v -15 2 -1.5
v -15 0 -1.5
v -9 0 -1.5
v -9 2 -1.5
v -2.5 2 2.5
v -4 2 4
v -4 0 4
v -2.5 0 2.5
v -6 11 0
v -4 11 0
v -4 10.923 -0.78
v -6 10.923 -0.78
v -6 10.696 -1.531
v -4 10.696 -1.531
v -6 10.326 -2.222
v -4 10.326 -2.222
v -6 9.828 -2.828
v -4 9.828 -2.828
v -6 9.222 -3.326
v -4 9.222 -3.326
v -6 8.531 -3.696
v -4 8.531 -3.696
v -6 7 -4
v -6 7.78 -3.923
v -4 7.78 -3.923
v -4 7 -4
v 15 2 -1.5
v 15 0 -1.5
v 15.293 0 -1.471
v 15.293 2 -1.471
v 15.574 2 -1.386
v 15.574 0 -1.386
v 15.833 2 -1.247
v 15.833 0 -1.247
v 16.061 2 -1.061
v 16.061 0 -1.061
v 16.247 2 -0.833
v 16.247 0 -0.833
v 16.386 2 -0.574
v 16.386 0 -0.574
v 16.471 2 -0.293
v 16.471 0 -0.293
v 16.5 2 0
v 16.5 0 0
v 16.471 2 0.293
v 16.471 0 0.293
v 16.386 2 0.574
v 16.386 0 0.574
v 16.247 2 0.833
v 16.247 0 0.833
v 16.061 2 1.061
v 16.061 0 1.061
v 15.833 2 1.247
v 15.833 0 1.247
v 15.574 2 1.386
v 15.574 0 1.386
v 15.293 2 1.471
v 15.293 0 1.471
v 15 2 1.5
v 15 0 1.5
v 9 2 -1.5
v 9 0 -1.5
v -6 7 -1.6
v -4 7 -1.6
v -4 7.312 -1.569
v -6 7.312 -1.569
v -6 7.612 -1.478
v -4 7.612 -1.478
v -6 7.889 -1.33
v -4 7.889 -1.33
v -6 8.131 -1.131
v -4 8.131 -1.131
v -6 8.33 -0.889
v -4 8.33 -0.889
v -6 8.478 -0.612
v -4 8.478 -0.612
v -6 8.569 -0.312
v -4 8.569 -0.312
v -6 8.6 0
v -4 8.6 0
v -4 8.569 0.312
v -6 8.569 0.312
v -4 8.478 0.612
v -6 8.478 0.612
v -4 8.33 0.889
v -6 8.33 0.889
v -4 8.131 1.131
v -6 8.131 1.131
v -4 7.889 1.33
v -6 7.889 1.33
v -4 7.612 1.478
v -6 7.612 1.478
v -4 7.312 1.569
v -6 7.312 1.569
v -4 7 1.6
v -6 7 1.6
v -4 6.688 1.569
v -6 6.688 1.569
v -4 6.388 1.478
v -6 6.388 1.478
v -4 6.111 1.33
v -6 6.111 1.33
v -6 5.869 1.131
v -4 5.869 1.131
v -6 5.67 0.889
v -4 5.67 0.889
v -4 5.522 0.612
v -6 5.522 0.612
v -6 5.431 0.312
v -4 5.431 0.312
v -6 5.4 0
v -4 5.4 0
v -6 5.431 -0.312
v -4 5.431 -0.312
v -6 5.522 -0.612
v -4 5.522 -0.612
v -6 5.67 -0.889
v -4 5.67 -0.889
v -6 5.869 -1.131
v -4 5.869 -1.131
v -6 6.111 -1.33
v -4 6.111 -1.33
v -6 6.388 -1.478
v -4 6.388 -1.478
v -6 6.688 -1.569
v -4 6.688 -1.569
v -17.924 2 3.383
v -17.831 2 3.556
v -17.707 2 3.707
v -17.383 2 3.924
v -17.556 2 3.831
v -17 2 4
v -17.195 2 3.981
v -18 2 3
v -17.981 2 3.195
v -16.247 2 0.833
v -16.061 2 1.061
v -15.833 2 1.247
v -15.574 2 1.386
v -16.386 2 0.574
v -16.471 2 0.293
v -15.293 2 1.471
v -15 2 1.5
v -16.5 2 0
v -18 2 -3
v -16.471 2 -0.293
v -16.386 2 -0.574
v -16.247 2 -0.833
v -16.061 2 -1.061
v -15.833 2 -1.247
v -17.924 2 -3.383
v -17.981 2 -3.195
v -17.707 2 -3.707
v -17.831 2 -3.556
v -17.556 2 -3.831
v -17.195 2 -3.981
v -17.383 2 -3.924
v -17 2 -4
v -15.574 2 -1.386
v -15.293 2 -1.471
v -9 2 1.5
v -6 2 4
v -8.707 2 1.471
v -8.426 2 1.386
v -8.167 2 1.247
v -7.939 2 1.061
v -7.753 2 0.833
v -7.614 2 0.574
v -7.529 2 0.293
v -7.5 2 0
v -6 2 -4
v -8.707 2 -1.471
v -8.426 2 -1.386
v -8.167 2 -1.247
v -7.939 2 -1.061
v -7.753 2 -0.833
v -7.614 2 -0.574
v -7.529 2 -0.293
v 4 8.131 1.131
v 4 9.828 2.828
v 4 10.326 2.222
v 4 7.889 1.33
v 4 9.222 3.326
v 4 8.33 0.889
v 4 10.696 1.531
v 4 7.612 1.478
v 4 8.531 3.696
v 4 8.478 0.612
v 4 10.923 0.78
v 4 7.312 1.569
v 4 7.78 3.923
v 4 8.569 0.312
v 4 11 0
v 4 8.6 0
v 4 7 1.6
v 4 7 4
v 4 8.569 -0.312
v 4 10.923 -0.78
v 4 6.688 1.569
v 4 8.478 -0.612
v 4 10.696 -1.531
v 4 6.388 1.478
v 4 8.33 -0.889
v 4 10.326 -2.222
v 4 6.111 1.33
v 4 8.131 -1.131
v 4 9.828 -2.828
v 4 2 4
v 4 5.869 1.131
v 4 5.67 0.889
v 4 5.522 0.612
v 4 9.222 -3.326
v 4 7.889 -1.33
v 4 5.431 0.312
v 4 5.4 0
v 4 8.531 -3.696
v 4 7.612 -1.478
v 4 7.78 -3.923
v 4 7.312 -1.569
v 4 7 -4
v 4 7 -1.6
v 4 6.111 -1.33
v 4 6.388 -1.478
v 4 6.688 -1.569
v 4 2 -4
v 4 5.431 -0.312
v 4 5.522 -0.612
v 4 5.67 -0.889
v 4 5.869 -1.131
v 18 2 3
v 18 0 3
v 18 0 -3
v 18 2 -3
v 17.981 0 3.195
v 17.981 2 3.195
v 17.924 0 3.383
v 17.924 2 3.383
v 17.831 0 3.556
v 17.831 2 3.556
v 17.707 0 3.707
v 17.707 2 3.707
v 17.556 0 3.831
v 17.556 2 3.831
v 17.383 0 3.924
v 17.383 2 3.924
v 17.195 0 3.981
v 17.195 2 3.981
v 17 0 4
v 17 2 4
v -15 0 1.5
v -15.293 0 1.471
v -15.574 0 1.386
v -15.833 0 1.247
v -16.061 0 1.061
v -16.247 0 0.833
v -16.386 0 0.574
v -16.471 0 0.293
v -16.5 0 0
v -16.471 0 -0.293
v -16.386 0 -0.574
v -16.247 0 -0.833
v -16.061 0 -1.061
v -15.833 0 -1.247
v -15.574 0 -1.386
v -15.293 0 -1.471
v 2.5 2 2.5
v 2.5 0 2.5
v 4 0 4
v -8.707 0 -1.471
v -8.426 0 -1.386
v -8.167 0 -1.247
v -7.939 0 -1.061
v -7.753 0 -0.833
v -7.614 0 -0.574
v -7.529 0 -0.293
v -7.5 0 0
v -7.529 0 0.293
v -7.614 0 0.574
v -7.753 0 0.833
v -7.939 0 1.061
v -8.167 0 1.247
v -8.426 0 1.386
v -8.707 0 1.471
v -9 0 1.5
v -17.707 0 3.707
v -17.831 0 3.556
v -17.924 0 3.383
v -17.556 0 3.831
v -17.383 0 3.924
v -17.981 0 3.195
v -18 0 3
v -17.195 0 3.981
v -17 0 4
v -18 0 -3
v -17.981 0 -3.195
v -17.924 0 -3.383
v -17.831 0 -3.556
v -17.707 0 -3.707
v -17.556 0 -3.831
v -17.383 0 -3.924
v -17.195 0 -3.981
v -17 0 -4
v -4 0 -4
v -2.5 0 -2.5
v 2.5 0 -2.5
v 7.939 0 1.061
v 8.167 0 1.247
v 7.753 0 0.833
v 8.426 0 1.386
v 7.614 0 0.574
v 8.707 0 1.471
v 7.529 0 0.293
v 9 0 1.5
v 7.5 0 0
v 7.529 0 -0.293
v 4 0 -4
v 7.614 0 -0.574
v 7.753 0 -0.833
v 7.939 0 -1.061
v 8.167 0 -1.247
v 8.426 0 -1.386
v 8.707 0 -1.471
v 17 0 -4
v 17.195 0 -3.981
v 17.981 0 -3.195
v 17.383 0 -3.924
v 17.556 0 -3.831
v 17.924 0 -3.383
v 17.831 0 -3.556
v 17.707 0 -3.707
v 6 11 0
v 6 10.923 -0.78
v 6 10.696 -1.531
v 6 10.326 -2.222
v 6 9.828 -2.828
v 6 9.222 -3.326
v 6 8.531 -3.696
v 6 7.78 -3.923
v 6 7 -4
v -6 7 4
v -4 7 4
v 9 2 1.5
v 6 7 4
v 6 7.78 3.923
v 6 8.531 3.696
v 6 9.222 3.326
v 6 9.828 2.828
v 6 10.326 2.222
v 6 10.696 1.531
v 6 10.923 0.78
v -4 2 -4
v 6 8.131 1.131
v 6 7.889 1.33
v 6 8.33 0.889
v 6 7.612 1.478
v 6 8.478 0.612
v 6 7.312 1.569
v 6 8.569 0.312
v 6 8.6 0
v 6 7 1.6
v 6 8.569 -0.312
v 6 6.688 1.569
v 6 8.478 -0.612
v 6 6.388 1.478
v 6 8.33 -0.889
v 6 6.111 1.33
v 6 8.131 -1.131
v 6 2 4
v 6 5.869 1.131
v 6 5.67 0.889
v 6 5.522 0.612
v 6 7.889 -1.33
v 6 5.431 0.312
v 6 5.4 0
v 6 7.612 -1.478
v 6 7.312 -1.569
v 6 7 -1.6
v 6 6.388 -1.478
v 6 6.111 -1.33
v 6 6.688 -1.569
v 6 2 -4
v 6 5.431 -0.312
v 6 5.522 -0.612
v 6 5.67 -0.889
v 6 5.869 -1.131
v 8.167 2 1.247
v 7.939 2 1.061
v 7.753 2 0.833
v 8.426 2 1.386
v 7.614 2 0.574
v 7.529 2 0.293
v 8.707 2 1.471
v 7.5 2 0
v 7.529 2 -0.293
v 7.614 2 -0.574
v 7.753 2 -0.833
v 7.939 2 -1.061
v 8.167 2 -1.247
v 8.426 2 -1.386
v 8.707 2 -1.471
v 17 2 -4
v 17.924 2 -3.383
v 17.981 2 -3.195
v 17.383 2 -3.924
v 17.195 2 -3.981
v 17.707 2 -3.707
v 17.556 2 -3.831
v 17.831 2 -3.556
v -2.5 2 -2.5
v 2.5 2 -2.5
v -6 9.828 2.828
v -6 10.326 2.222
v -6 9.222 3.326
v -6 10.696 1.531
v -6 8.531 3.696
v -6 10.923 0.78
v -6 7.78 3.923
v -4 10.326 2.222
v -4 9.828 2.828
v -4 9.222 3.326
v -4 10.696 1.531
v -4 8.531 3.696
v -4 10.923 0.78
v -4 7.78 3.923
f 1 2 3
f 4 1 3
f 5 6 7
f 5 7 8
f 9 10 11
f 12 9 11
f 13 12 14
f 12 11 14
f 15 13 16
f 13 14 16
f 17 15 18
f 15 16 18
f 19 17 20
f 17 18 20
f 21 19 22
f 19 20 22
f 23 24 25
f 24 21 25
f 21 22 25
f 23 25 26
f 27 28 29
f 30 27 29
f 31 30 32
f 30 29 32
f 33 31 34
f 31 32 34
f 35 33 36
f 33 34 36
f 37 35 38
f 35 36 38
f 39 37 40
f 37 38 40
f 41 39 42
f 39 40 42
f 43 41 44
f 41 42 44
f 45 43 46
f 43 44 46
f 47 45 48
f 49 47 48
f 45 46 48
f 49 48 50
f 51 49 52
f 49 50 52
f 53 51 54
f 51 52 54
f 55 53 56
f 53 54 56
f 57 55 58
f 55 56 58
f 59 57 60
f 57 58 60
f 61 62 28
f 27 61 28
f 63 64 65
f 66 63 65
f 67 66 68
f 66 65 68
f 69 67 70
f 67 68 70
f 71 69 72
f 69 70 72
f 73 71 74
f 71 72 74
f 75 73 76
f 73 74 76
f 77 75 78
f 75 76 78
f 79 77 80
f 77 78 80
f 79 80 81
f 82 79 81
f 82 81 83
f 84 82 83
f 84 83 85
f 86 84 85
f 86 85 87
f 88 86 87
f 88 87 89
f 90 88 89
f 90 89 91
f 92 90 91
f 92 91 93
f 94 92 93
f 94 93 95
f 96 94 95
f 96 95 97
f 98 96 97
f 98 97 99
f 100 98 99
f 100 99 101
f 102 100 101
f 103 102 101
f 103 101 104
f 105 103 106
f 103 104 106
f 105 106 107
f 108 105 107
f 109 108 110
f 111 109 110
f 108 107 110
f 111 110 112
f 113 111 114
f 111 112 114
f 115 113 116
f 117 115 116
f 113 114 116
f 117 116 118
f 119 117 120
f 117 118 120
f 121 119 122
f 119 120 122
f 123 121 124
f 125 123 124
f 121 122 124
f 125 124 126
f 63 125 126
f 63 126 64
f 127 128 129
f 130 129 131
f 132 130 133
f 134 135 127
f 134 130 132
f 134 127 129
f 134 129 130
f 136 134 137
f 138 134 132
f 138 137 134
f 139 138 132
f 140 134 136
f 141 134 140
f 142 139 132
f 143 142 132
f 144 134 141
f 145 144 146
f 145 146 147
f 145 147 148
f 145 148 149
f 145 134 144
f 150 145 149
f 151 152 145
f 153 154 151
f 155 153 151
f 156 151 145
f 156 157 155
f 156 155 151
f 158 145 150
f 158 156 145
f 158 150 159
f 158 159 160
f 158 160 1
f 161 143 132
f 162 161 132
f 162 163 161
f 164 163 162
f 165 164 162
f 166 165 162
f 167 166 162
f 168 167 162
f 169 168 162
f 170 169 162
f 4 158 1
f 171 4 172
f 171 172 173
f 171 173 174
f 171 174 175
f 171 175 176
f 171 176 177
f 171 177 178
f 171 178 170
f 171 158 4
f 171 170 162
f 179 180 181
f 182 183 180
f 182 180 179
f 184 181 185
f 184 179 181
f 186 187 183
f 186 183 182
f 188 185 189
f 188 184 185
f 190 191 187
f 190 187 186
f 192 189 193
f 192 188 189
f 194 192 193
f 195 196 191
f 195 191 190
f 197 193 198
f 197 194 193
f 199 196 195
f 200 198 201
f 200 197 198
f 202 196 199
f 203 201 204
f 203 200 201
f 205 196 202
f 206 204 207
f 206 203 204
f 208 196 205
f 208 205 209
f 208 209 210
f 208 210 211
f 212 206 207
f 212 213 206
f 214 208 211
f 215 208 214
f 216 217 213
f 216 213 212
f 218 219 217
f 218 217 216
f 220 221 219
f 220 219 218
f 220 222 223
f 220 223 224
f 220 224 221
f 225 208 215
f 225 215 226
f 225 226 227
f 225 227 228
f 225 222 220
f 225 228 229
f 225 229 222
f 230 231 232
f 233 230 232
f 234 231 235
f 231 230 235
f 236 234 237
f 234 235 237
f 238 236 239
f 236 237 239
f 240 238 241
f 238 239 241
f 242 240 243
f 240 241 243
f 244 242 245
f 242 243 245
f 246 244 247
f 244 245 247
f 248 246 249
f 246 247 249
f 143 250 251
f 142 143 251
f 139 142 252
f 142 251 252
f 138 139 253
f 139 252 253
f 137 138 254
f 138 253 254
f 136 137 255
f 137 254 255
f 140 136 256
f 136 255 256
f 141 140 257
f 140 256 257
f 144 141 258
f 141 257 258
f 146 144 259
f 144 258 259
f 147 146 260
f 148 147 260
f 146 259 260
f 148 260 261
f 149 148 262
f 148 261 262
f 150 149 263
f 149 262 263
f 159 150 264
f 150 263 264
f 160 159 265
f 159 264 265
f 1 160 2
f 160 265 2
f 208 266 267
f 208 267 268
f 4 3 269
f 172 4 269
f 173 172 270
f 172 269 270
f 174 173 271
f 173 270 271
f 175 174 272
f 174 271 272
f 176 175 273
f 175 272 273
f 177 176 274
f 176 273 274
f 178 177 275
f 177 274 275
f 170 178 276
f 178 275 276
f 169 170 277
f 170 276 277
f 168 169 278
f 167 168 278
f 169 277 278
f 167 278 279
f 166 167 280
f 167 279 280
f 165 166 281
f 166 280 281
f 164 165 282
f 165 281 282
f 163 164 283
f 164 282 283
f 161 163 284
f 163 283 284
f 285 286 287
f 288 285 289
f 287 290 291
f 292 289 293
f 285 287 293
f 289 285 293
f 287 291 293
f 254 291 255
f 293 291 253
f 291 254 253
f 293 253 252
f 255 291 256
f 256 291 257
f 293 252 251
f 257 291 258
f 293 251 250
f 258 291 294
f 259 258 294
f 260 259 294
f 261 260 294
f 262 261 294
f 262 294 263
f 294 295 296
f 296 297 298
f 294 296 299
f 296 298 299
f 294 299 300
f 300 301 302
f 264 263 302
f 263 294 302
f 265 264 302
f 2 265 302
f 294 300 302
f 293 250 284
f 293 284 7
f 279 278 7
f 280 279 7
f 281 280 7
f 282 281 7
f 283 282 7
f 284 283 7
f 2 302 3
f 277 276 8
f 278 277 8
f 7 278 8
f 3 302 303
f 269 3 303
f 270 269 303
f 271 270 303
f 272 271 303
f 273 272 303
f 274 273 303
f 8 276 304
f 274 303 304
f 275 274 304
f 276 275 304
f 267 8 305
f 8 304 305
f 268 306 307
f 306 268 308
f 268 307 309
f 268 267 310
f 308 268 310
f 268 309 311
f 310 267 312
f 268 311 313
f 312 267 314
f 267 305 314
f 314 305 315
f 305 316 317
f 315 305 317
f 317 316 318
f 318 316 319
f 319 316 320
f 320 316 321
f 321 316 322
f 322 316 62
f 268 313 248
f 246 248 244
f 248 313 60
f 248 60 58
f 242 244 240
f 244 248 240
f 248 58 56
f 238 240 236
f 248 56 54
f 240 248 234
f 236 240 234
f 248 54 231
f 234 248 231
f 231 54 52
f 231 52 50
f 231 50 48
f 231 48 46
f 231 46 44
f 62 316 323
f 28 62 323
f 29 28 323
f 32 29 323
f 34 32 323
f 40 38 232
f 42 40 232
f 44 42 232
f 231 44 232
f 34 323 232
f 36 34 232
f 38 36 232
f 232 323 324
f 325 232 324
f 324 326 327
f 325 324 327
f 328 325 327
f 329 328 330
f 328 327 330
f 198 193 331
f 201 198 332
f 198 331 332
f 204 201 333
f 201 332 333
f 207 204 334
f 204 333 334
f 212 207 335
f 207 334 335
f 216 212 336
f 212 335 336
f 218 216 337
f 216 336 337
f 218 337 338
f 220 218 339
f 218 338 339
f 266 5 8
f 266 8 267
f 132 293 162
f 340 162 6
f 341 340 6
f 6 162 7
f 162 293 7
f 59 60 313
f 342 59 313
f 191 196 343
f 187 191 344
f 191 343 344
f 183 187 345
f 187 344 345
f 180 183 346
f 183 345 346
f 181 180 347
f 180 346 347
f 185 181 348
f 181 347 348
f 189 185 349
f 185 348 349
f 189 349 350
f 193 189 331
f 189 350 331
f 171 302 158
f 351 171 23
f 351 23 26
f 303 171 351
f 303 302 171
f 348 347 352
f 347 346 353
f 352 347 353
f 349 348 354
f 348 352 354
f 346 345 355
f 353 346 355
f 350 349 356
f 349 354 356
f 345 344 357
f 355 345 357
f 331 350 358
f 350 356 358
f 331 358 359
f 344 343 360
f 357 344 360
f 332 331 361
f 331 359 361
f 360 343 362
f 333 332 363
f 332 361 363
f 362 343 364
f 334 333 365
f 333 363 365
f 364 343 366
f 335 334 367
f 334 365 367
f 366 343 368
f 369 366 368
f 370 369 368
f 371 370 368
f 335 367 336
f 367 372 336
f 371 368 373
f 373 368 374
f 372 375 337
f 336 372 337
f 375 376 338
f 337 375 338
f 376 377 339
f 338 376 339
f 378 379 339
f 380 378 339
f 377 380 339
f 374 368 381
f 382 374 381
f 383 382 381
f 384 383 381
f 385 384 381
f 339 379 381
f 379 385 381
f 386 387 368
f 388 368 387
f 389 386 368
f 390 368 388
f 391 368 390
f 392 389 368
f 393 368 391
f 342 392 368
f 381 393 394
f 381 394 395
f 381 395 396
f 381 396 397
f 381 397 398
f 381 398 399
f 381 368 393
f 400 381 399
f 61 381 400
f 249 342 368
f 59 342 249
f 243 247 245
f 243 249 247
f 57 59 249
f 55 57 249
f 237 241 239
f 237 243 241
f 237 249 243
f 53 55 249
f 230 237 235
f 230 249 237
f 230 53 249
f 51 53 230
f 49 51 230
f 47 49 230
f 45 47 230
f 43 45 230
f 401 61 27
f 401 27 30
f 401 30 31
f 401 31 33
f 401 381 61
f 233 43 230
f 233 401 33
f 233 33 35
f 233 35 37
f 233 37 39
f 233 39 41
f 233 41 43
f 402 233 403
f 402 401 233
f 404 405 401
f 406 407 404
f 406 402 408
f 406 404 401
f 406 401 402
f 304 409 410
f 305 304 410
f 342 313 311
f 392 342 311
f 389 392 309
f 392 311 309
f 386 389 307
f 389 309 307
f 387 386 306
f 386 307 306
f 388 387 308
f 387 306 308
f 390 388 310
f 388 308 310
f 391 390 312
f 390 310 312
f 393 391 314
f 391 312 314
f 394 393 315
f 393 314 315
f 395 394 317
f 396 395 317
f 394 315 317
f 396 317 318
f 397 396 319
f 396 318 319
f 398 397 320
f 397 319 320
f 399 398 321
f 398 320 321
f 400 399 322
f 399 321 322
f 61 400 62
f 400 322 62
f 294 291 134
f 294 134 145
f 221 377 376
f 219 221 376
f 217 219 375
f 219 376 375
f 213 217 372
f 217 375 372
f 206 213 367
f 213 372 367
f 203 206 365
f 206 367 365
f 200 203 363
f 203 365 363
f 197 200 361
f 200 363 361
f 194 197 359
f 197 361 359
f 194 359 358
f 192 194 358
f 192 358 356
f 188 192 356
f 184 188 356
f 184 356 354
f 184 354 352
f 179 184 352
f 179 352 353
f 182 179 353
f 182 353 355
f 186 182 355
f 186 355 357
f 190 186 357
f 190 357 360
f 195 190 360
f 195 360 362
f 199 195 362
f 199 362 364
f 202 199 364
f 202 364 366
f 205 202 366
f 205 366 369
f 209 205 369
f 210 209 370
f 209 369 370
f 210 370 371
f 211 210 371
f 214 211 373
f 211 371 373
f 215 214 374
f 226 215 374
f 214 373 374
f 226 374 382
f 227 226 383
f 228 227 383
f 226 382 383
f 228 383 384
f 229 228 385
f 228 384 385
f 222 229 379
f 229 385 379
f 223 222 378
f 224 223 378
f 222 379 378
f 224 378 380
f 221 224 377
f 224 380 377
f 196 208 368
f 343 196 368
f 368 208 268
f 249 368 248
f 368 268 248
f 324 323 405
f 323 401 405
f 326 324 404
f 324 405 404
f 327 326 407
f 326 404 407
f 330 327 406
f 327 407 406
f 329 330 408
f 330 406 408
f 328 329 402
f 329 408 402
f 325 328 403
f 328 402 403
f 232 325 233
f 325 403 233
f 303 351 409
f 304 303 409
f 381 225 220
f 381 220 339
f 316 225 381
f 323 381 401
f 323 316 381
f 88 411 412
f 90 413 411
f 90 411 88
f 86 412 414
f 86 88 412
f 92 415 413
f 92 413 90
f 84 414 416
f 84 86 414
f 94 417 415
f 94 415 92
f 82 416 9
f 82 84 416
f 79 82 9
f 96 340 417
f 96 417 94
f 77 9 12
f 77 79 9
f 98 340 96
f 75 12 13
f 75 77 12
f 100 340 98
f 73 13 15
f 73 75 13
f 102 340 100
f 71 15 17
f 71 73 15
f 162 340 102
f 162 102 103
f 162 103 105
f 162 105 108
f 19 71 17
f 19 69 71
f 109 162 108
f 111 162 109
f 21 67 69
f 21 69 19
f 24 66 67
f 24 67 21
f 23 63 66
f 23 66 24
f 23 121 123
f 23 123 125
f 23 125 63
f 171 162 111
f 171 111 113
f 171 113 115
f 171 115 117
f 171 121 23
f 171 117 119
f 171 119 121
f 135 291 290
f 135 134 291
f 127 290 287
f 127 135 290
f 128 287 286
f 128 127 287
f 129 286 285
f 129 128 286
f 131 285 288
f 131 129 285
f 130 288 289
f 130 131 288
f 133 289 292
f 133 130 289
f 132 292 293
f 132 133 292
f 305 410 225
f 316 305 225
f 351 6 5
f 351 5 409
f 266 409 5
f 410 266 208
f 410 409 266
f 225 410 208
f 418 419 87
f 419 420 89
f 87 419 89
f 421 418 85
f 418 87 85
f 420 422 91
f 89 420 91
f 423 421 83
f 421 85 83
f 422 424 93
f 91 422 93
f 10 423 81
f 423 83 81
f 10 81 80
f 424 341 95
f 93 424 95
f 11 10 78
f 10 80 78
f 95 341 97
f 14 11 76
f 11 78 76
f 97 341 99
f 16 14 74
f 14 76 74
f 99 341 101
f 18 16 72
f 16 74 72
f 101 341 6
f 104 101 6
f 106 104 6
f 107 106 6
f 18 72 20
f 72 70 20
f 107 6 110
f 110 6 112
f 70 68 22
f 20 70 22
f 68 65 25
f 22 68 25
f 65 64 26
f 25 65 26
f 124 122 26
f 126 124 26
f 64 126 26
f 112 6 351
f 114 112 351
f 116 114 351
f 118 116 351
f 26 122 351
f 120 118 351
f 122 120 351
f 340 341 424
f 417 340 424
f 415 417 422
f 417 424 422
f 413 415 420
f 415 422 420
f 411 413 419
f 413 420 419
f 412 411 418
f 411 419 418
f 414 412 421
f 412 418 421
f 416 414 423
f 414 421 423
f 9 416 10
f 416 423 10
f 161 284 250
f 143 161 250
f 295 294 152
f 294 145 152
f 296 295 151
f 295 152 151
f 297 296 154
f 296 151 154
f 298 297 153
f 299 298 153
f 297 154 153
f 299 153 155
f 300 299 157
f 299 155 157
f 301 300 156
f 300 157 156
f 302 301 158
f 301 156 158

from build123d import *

# Parameters (mm, degrees)
SKETCH_1_W          = 36
SKETCH_1_H          = 8
EXTRUDE_1_DEPTH     = 2
SKETCH_2_W          = 2
SKETCH_2_H          = 8
EXTRUDE_2_DEPTH     = 9
CUT_EXTRUDE_1_DEPTH = 21.518284529
SKETCH_4_R          = 1.6
CUT_EXTRUDE_2_DEPTH = 27.702059846
FILLET_1_R          = 1


with BuildPart() as part:
    # 草图1 → 凸台-拉伸1 (new body)
    with BuildSketch(Plane(origin=(0, 0, 0), x_dir=(1, 0, 0), z_dir=(0, 1, 0))):
        Rectangle(SKETCH_1_W, SKETCH_1_H)
        with BuildLine():
            Line((-15, 1.5), (-9, 1.5))
            ThreePointArc((-9, 1.5), (-7.5, 0), (-9, -1.5))
            Line((-9, -1.5), (-15, -1.5))
            ThreePointArc((-15, -1.5), (-16.5, 0), (-15, 1.5))
        make_face(mode=Mode.SUBTRACT)
        with BuildLine():
            Line((9, 1.5), (15, 1.5))
            ThreePointArc((15, 1.5), (16.5, 0), (15, -1.5))
            Line((15, -1.5), (9, -1.5))
            ThreePointArc((9, -1.5), (7.5, 0), (9, 1.5))
        make_face(mode=Mode.SUBTRACT)
    extrude(amount=EXTRUDE_1_DEPTH)

    # 草图2 → 凸台-拉伸2 (add)
    with BuildSketch(Plane(origin=(0, 2, 0), x_dir=(1, 0, 0), z_dir=(0, 1, 0))):
        with Locations((-5, 0)):
            Rectangle(SKETCH_2_W, SKETCH_2_H)
        with Locations((5, 0)):
            Rectangle(SKETCH_2_W, SKETCH_2_H)
    extrude(amount=EXTRUDE_2_DEPTH)

    # 草图3 → 切除-拉伸1 (cut, through all)
    with BuildSketch(Plane(origin=(0, 2, 0), x_dir=(1, 0, 0), z_dir=(0, 1, 0))):
        Polygon((2.5, -2.5), (4, -4), (-4, -4), (-2.5, -2.5), align=None)
        Polygon((-2.5, 2.5), (2.5, 2.5), (4, 4), (-4, 4), align=None)
    extrude(amount=-CUT_EXTRUDE_1_DEPTH, mode=Mode.SUBTRACT)

    # 草图4 → 切除-拉伸2 (cut, through all)
    with BuildSketch(Plane(origin=(6, 0, 0), x_dir=(0, 0, -1), z_dir=(1, 0, 0))):
        with Locations((0, 7)):
            Circle(SKETCH_4_R)
        with BuildLine():
            Line((-4, 11), (-4, 6.999999618))
            ThreePointArc((-4, 6.999999618), (-2.82842726, 9.82842699), (0, 11))
            Line((0, 11), (-4, 11))
        make_face()
        with BuildLine():
            ThreePointArc((0, 11), (2.828427125, 9.828427125), (4, 7))
            Line((4, 7), (4, 11))
            Line((4, 11), (0, 11))
        make_face()
    extrude(amount=-CUT_EXTRUDE_2_DEPTH, mode=Mode.SUBTRACT)

    # 圆角1
    fillet_1_edges = [part.edges().sort_by_distance(p)[0] for p in [
        (18, 1, 4),
        (-18, 1, 4),
        (-18, 1, -4),
        (18, 1, -4),
    ]]
    fillet(fillet_1_edges, radius=FILLET_1_R)


solid = part.part
